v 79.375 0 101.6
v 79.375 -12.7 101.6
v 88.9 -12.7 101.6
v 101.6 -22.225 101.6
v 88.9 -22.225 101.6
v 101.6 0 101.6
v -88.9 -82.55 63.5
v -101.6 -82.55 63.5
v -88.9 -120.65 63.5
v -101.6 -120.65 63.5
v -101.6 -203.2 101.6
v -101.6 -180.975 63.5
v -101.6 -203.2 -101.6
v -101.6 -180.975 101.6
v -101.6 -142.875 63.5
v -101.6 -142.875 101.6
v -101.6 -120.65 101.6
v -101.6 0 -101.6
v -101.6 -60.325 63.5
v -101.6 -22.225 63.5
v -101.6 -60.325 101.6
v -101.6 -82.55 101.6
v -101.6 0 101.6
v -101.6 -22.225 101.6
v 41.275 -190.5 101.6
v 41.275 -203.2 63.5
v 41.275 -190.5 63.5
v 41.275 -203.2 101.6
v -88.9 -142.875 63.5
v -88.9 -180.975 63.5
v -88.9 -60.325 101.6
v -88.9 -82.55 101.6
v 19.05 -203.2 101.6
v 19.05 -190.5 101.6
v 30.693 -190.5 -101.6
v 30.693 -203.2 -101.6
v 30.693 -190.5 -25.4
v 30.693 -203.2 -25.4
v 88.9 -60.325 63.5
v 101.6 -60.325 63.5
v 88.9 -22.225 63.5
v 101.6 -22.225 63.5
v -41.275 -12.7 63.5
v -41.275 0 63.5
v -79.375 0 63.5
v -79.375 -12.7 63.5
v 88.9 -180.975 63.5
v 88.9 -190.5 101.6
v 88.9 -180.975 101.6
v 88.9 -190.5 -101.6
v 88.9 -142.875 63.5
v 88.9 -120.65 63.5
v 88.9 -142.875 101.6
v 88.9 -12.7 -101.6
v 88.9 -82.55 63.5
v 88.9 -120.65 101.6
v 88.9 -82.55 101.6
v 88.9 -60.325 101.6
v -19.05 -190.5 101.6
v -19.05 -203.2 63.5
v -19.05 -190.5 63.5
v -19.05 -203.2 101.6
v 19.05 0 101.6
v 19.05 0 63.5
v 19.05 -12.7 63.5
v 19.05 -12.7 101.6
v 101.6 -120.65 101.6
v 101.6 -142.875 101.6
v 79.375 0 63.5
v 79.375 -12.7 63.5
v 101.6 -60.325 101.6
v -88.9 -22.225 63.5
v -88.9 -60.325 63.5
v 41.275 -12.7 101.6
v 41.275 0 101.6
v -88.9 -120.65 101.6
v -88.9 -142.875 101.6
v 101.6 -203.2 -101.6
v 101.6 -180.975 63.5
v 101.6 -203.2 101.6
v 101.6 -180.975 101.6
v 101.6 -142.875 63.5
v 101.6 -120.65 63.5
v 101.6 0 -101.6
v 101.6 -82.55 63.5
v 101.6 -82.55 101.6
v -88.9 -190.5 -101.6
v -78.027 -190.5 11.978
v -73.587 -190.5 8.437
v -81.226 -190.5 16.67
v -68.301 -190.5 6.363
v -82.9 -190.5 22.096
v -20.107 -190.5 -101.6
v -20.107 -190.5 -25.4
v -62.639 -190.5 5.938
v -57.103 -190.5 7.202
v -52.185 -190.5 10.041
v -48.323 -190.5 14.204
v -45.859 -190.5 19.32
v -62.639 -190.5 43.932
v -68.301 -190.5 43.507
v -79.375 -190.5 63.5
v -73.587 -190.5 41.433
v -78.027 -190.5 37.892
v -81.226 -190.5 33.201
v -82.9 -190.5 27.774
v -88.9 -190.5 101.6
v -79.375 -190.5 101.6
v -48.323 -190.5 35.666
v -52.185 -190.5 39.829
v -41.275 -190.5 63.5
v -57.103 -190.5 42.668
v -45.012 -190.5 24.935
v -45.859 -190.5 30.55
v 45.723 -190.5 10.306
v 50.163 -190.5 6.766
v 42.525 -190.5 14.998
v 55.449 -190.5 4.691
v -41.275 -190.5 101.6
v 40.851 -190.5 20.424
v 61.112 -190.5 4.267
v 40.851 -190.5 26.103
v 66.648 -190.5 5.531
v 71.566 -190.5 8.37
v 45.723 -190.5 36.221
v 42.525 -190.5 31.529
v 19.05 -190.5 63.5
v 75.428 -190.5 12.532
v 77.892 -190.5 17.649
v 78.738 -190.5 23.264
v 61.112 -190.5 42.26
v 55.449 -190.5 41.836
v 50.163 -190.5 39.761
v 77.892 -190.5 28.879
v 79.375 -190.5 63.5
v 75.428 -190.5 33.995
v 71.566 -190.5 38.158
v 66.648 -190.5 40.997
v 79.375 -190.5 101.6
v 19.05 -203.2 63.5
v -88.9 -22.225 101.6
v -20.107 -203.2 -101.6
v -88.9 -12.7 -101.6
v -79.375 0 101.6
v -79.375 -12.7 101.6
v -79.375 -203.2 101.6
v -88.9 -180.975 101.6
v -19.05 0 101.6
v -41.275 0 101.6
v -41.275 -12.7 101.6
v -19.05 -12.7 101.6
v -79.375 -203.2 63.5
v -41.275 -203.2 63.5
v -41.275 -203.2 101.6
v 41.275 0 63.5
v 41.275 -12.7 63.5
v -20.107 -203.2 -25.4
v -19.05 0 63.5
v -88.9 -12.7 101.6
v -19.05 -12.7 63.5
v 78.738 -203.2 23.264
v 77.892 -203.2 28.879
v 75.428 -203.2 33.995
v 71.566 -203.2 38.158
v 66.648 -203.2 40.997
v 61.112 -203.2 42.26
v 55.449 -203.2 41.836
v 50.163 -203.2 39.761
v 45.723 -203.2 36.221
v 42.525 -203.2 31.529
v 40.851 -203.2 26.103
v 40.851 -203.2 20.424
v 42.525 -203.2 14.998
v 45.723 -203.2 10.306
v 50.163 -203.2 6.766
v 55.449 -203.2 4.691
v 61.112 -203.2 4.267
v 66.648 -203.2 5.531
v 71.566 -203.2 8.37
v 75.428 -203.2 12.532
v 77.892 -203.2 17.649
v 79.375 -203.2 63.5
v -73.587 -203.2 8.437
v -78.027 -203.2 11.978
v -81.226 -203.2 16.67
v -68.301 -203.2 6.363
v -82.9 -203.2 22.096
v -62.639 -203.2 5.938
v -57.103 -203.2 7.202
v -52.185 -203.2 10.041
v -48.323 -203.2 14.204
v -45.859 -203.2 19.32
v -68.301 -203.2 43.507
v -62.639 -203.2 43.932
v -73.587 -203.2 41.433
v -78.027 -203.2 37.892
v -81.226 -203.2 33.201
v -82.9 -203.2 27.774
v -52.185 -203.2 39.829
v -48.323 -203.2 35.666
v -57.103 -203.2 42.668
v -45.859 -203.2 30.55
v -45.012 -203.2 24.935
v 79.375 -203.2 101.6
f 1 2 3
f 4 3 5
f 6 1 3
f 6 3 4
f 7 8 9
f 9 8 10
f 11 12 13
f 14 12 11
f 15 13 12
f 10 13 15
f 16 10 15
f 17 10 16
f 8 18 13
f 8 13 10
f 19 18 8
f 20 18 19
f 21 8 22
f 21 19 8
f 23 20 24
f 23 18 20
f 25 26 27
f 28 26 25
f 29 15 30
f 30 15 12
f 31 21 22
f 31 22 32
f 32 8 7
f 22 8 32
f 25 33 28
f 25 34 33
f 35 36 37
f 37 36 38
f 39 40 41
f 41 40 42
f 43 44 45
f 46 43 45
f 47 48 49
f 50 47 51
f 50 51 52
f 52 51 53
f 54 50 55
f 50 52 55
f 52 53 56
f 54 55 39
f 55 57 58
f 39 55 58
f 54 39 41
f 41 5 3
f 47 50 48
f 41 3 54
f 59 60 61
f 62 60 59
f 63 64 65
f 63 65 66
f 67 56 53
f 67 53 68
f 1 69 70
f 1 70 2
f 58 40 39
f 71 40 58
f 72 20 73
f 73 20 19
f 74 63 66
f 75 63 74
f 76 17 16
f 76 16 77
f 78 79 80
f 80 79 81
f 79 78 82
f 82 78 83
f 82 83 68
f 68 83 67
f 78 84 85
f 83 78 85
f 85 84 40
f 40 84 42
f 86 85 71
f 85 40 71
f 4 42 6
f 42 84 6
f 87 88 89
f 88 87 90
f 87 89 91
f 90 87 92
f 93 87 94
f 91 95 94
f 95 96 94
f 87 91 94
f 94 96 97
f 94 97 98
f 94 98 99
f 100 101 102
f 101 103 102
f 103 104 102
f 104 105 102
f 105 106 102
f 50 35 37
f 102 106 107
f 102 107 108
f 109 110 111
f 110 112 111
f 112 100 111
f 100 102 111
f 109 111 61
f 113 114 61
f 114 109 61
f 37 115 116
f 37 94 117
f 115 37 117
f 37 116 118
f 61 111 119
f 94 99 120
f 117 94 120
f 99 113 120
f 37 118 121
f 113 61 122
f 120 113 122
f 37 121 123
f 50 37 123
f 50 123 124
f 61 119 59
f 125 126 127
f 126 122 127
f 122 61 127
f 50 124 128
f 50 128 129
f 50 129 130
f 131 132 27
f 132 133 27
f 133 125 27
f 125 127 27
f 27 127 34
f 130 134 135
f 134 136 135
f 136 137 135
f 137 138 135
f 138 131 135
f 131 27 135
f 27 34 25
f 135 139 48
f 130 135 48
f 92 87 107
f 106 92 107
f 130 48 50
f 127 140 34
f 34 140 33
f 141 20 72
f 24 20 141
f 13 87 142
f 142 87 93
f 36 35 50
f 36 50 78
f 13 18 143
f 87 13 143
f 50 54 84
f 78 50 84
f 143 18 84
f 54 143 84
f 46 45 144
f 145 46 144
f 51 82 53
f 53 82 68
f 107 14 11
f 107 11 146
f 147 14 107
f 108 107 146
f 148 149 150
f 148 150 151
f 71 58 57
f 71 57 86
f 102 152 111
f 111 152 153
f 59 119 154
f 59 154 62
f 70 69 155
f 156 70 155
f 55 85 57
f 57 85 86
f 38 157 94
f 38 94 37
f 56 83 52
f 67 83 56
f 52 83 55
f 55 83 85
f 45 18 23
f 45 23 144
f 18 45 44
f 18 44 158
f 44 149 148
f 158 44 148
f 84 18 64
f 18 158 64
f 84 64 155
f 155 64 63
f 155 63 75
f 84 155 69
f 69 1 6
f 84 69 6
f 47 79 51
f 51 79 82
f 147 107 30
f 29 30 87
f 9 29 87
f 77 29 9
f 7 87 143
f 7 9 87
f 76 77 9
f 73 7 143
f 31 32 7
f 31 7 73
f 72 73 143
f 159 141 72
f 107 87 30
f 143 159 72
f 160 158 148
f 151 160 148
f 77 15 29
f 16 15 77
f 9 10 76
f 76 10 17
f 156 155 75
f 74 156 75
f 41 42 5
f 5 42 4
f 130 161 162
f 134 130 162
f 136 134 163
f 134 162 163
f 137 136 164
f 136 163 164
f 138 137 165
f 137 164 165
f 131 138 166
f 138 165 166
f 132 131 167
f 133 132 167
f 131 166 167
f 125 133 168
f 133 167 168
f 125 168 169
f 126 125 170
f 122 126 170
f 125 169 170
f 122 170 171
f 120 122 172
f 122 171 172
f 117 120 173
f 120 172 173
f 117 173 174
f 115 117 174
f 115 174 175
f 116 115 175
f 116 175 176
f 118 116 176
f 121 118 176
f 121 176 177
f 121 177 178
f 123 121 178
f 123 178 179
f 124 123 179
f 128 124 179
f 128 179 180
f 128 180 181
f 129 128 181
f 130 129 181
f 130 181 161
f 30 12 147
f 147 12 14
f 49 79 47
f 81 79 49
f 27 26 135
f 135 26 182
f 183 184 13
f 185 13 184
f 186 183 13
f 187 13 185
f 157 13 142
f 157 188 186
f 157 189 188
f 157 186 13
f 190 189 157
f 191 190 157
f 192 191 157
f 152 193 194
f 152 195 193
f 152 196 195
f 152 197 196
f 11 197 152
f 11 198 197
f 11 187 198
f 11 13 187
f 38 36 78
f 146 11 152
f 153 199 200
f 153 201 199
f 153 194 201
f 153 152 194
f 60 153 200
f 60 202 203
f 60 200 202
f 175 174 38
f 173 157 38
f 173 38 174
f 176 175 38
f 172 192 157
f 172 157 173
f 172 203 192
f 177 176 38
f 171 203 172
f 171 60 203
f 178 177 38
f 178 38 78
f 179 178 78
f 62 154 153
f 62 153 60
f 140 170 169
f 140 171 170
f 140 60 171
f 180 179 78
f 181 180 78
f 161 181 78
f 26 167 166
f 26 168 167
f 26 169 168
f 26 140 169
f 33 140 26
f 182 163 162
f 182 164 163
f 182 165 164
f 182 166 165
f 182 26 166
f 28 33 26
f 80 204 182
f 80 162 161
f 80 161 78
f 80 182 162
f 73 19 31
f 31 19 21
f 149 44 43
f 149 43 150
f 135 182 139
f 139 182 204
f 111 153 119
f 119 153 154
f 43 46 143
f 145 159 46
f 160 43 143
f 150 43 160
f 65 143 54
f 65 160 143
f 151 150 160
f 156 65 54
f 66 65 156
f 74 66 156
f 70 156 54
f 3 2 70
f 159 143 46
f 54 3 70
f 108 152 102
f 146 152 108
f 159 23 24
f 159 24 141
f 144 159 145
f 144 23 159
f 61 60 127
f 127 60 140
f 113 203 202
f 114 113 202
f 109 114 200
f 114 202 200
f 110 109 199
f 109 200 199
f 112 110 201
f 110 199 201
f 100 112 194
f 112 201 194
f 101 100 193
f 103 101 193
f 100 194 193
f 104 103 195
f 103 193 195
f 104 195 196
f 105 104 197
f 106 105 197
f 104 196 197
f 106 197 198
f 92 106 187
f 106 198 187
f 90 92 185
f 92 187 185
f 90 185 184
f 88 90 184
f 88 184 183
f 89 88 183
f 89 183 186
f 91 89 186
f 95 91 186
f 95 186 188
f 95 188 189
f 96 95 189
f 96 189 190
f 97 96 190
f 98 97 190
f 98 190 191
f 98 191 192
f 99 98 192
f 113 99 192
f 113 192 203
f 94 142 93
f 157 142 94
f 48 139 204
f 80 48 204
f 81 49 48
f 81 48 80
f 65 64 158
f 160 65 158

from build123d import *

# Parameters (mm, degrees)
F0_W      = 203.2
F0_H      = 203.2
F1_DEPTH  = 203.2
F2_W      = 177.8
F2_H      = 177.8
F3_DEPTH  = 203.2
F4_W      = 50.8
F4_H      = 76.2
F5_DEPTH  = 25.4
F6_W      = 38.1
F6_H      = 38.1
F7_DEPTH  = 25.4
F8_W      = 38.1
F8_H      = 38.1
F9_DEPTH  = 25.4
F10_W     = 38.1
F10_H     = 38.1
F11_DEPTH = 25.4
F12_W     = 38.1
F12_H     = 38.1
F13_DEPTH = 25.4
F14_R     = 19.05
F15_DEPTH = 25.4


with BuildPart() as f1:
    # F0 (on Front) → F1 (new body)
    with BuildSketch(Plane.XZ):
        Rectangle(F0_W, F0_H)
    extrude(amount=F1_DEPTH)

    # F2 (on face) → F3 (cut)
    with BuildSketch(Plane.XY.offset(101.6)):
        with Locations((0, -101.6)):
            Rectangle(F2_W, F2_H)
    extrude(amount=-F3_DEPTH, mode=Mode.SUBTRACT)

    # F4 (on face) → F5 (cut)
    with BuildSketch(Plane.XZ.offset(203.2)):
        with Locations((5.292703, -63.5)):
            Rectangle(F4_W, F4_H)
    extrude(amount=-F5_DEPTH, mode=Mode.SUBTRACT)

    # F6 (on face) → F7 (cut)
    with BuildSketch(Plane.XZ.offset(203.2)):
        with Locations((-60.325, 82.55)):
            Rectangle(F6_W, F6_H)
        with Locations((0, 82.55)):
            Rectangle(F6_W, F6_H)
        with Locations((60.325, 82.55)):
            Rectangle(F6_W, F6_H)
    extrude(amount=-F7_DEPTH, mode=Mode.SUBTRACT)

    # F8 (on face) → F9 (cut)
    with BuildSketch(Plane.YZ.offset(101.6)):
        with Locations((-161.925, 82.55)):
            Rectangle(F8_W, F8_H)
        with Locations((-101.6, 82.55)):
            Rectangle(F8_W, F8_H)
        with Locations((-41.275, 82.55)):
            Rectangle(F8_W, F8_H)
    extrude(amount=-F9_DEPTH, mode=Mode.SUBTRACT)

    # F10 (on face) → F11 (cut)
    with BuildSketch(Plane(origin=(0, 0, 0), x_dir=(-1, 0, 0), z_dir=(0, 1, 0))):
        with Locations((-60.325, 82.55)):
            Rectangle(F10_W, F10_H)
        with Locations((0, 82.55)):
            Rectangle(F10_W, F10_H)
        with Locations((60.325, 82.55)):
            Rectangle(F10_W, F10_H)
    extrude(amount=-F11_DEPTH, mode=Mode.SUBTRACT)

    # F12 (on face) → F13 (cut)
    with BuildSketch(Plane(origin=(-101.6, 0, 0), x_dir=(0, -1, 0), z_dir=(-1, 0, 0))):
        with Locations((41.275, 82.55)):
            Rectangle(F12_W, F12_H)
        with Locations((101.6, 82.55)):
            Rectangle(F12_W, F12_H)
        with Locations((161.925, 82.55)):
            Rectangle(F12_W, F12_H)
    extrude(amount=-F13_DEPTH, mode=Mode.SUBTRACT)

    # F14 (on face) → F15 (cut)
    with BuildSketch(Plane.XZ.offset(203.2)):
        with Locations((-64.062351, 24.935062)):
            Circle(F14_R)
        with Locations((59.688135, 23.263682)):
            Circle(F14_R)
    extrude(amount=-F15_DEPTH, mode=Mode.SUBTRACT)


solid = f1.part
